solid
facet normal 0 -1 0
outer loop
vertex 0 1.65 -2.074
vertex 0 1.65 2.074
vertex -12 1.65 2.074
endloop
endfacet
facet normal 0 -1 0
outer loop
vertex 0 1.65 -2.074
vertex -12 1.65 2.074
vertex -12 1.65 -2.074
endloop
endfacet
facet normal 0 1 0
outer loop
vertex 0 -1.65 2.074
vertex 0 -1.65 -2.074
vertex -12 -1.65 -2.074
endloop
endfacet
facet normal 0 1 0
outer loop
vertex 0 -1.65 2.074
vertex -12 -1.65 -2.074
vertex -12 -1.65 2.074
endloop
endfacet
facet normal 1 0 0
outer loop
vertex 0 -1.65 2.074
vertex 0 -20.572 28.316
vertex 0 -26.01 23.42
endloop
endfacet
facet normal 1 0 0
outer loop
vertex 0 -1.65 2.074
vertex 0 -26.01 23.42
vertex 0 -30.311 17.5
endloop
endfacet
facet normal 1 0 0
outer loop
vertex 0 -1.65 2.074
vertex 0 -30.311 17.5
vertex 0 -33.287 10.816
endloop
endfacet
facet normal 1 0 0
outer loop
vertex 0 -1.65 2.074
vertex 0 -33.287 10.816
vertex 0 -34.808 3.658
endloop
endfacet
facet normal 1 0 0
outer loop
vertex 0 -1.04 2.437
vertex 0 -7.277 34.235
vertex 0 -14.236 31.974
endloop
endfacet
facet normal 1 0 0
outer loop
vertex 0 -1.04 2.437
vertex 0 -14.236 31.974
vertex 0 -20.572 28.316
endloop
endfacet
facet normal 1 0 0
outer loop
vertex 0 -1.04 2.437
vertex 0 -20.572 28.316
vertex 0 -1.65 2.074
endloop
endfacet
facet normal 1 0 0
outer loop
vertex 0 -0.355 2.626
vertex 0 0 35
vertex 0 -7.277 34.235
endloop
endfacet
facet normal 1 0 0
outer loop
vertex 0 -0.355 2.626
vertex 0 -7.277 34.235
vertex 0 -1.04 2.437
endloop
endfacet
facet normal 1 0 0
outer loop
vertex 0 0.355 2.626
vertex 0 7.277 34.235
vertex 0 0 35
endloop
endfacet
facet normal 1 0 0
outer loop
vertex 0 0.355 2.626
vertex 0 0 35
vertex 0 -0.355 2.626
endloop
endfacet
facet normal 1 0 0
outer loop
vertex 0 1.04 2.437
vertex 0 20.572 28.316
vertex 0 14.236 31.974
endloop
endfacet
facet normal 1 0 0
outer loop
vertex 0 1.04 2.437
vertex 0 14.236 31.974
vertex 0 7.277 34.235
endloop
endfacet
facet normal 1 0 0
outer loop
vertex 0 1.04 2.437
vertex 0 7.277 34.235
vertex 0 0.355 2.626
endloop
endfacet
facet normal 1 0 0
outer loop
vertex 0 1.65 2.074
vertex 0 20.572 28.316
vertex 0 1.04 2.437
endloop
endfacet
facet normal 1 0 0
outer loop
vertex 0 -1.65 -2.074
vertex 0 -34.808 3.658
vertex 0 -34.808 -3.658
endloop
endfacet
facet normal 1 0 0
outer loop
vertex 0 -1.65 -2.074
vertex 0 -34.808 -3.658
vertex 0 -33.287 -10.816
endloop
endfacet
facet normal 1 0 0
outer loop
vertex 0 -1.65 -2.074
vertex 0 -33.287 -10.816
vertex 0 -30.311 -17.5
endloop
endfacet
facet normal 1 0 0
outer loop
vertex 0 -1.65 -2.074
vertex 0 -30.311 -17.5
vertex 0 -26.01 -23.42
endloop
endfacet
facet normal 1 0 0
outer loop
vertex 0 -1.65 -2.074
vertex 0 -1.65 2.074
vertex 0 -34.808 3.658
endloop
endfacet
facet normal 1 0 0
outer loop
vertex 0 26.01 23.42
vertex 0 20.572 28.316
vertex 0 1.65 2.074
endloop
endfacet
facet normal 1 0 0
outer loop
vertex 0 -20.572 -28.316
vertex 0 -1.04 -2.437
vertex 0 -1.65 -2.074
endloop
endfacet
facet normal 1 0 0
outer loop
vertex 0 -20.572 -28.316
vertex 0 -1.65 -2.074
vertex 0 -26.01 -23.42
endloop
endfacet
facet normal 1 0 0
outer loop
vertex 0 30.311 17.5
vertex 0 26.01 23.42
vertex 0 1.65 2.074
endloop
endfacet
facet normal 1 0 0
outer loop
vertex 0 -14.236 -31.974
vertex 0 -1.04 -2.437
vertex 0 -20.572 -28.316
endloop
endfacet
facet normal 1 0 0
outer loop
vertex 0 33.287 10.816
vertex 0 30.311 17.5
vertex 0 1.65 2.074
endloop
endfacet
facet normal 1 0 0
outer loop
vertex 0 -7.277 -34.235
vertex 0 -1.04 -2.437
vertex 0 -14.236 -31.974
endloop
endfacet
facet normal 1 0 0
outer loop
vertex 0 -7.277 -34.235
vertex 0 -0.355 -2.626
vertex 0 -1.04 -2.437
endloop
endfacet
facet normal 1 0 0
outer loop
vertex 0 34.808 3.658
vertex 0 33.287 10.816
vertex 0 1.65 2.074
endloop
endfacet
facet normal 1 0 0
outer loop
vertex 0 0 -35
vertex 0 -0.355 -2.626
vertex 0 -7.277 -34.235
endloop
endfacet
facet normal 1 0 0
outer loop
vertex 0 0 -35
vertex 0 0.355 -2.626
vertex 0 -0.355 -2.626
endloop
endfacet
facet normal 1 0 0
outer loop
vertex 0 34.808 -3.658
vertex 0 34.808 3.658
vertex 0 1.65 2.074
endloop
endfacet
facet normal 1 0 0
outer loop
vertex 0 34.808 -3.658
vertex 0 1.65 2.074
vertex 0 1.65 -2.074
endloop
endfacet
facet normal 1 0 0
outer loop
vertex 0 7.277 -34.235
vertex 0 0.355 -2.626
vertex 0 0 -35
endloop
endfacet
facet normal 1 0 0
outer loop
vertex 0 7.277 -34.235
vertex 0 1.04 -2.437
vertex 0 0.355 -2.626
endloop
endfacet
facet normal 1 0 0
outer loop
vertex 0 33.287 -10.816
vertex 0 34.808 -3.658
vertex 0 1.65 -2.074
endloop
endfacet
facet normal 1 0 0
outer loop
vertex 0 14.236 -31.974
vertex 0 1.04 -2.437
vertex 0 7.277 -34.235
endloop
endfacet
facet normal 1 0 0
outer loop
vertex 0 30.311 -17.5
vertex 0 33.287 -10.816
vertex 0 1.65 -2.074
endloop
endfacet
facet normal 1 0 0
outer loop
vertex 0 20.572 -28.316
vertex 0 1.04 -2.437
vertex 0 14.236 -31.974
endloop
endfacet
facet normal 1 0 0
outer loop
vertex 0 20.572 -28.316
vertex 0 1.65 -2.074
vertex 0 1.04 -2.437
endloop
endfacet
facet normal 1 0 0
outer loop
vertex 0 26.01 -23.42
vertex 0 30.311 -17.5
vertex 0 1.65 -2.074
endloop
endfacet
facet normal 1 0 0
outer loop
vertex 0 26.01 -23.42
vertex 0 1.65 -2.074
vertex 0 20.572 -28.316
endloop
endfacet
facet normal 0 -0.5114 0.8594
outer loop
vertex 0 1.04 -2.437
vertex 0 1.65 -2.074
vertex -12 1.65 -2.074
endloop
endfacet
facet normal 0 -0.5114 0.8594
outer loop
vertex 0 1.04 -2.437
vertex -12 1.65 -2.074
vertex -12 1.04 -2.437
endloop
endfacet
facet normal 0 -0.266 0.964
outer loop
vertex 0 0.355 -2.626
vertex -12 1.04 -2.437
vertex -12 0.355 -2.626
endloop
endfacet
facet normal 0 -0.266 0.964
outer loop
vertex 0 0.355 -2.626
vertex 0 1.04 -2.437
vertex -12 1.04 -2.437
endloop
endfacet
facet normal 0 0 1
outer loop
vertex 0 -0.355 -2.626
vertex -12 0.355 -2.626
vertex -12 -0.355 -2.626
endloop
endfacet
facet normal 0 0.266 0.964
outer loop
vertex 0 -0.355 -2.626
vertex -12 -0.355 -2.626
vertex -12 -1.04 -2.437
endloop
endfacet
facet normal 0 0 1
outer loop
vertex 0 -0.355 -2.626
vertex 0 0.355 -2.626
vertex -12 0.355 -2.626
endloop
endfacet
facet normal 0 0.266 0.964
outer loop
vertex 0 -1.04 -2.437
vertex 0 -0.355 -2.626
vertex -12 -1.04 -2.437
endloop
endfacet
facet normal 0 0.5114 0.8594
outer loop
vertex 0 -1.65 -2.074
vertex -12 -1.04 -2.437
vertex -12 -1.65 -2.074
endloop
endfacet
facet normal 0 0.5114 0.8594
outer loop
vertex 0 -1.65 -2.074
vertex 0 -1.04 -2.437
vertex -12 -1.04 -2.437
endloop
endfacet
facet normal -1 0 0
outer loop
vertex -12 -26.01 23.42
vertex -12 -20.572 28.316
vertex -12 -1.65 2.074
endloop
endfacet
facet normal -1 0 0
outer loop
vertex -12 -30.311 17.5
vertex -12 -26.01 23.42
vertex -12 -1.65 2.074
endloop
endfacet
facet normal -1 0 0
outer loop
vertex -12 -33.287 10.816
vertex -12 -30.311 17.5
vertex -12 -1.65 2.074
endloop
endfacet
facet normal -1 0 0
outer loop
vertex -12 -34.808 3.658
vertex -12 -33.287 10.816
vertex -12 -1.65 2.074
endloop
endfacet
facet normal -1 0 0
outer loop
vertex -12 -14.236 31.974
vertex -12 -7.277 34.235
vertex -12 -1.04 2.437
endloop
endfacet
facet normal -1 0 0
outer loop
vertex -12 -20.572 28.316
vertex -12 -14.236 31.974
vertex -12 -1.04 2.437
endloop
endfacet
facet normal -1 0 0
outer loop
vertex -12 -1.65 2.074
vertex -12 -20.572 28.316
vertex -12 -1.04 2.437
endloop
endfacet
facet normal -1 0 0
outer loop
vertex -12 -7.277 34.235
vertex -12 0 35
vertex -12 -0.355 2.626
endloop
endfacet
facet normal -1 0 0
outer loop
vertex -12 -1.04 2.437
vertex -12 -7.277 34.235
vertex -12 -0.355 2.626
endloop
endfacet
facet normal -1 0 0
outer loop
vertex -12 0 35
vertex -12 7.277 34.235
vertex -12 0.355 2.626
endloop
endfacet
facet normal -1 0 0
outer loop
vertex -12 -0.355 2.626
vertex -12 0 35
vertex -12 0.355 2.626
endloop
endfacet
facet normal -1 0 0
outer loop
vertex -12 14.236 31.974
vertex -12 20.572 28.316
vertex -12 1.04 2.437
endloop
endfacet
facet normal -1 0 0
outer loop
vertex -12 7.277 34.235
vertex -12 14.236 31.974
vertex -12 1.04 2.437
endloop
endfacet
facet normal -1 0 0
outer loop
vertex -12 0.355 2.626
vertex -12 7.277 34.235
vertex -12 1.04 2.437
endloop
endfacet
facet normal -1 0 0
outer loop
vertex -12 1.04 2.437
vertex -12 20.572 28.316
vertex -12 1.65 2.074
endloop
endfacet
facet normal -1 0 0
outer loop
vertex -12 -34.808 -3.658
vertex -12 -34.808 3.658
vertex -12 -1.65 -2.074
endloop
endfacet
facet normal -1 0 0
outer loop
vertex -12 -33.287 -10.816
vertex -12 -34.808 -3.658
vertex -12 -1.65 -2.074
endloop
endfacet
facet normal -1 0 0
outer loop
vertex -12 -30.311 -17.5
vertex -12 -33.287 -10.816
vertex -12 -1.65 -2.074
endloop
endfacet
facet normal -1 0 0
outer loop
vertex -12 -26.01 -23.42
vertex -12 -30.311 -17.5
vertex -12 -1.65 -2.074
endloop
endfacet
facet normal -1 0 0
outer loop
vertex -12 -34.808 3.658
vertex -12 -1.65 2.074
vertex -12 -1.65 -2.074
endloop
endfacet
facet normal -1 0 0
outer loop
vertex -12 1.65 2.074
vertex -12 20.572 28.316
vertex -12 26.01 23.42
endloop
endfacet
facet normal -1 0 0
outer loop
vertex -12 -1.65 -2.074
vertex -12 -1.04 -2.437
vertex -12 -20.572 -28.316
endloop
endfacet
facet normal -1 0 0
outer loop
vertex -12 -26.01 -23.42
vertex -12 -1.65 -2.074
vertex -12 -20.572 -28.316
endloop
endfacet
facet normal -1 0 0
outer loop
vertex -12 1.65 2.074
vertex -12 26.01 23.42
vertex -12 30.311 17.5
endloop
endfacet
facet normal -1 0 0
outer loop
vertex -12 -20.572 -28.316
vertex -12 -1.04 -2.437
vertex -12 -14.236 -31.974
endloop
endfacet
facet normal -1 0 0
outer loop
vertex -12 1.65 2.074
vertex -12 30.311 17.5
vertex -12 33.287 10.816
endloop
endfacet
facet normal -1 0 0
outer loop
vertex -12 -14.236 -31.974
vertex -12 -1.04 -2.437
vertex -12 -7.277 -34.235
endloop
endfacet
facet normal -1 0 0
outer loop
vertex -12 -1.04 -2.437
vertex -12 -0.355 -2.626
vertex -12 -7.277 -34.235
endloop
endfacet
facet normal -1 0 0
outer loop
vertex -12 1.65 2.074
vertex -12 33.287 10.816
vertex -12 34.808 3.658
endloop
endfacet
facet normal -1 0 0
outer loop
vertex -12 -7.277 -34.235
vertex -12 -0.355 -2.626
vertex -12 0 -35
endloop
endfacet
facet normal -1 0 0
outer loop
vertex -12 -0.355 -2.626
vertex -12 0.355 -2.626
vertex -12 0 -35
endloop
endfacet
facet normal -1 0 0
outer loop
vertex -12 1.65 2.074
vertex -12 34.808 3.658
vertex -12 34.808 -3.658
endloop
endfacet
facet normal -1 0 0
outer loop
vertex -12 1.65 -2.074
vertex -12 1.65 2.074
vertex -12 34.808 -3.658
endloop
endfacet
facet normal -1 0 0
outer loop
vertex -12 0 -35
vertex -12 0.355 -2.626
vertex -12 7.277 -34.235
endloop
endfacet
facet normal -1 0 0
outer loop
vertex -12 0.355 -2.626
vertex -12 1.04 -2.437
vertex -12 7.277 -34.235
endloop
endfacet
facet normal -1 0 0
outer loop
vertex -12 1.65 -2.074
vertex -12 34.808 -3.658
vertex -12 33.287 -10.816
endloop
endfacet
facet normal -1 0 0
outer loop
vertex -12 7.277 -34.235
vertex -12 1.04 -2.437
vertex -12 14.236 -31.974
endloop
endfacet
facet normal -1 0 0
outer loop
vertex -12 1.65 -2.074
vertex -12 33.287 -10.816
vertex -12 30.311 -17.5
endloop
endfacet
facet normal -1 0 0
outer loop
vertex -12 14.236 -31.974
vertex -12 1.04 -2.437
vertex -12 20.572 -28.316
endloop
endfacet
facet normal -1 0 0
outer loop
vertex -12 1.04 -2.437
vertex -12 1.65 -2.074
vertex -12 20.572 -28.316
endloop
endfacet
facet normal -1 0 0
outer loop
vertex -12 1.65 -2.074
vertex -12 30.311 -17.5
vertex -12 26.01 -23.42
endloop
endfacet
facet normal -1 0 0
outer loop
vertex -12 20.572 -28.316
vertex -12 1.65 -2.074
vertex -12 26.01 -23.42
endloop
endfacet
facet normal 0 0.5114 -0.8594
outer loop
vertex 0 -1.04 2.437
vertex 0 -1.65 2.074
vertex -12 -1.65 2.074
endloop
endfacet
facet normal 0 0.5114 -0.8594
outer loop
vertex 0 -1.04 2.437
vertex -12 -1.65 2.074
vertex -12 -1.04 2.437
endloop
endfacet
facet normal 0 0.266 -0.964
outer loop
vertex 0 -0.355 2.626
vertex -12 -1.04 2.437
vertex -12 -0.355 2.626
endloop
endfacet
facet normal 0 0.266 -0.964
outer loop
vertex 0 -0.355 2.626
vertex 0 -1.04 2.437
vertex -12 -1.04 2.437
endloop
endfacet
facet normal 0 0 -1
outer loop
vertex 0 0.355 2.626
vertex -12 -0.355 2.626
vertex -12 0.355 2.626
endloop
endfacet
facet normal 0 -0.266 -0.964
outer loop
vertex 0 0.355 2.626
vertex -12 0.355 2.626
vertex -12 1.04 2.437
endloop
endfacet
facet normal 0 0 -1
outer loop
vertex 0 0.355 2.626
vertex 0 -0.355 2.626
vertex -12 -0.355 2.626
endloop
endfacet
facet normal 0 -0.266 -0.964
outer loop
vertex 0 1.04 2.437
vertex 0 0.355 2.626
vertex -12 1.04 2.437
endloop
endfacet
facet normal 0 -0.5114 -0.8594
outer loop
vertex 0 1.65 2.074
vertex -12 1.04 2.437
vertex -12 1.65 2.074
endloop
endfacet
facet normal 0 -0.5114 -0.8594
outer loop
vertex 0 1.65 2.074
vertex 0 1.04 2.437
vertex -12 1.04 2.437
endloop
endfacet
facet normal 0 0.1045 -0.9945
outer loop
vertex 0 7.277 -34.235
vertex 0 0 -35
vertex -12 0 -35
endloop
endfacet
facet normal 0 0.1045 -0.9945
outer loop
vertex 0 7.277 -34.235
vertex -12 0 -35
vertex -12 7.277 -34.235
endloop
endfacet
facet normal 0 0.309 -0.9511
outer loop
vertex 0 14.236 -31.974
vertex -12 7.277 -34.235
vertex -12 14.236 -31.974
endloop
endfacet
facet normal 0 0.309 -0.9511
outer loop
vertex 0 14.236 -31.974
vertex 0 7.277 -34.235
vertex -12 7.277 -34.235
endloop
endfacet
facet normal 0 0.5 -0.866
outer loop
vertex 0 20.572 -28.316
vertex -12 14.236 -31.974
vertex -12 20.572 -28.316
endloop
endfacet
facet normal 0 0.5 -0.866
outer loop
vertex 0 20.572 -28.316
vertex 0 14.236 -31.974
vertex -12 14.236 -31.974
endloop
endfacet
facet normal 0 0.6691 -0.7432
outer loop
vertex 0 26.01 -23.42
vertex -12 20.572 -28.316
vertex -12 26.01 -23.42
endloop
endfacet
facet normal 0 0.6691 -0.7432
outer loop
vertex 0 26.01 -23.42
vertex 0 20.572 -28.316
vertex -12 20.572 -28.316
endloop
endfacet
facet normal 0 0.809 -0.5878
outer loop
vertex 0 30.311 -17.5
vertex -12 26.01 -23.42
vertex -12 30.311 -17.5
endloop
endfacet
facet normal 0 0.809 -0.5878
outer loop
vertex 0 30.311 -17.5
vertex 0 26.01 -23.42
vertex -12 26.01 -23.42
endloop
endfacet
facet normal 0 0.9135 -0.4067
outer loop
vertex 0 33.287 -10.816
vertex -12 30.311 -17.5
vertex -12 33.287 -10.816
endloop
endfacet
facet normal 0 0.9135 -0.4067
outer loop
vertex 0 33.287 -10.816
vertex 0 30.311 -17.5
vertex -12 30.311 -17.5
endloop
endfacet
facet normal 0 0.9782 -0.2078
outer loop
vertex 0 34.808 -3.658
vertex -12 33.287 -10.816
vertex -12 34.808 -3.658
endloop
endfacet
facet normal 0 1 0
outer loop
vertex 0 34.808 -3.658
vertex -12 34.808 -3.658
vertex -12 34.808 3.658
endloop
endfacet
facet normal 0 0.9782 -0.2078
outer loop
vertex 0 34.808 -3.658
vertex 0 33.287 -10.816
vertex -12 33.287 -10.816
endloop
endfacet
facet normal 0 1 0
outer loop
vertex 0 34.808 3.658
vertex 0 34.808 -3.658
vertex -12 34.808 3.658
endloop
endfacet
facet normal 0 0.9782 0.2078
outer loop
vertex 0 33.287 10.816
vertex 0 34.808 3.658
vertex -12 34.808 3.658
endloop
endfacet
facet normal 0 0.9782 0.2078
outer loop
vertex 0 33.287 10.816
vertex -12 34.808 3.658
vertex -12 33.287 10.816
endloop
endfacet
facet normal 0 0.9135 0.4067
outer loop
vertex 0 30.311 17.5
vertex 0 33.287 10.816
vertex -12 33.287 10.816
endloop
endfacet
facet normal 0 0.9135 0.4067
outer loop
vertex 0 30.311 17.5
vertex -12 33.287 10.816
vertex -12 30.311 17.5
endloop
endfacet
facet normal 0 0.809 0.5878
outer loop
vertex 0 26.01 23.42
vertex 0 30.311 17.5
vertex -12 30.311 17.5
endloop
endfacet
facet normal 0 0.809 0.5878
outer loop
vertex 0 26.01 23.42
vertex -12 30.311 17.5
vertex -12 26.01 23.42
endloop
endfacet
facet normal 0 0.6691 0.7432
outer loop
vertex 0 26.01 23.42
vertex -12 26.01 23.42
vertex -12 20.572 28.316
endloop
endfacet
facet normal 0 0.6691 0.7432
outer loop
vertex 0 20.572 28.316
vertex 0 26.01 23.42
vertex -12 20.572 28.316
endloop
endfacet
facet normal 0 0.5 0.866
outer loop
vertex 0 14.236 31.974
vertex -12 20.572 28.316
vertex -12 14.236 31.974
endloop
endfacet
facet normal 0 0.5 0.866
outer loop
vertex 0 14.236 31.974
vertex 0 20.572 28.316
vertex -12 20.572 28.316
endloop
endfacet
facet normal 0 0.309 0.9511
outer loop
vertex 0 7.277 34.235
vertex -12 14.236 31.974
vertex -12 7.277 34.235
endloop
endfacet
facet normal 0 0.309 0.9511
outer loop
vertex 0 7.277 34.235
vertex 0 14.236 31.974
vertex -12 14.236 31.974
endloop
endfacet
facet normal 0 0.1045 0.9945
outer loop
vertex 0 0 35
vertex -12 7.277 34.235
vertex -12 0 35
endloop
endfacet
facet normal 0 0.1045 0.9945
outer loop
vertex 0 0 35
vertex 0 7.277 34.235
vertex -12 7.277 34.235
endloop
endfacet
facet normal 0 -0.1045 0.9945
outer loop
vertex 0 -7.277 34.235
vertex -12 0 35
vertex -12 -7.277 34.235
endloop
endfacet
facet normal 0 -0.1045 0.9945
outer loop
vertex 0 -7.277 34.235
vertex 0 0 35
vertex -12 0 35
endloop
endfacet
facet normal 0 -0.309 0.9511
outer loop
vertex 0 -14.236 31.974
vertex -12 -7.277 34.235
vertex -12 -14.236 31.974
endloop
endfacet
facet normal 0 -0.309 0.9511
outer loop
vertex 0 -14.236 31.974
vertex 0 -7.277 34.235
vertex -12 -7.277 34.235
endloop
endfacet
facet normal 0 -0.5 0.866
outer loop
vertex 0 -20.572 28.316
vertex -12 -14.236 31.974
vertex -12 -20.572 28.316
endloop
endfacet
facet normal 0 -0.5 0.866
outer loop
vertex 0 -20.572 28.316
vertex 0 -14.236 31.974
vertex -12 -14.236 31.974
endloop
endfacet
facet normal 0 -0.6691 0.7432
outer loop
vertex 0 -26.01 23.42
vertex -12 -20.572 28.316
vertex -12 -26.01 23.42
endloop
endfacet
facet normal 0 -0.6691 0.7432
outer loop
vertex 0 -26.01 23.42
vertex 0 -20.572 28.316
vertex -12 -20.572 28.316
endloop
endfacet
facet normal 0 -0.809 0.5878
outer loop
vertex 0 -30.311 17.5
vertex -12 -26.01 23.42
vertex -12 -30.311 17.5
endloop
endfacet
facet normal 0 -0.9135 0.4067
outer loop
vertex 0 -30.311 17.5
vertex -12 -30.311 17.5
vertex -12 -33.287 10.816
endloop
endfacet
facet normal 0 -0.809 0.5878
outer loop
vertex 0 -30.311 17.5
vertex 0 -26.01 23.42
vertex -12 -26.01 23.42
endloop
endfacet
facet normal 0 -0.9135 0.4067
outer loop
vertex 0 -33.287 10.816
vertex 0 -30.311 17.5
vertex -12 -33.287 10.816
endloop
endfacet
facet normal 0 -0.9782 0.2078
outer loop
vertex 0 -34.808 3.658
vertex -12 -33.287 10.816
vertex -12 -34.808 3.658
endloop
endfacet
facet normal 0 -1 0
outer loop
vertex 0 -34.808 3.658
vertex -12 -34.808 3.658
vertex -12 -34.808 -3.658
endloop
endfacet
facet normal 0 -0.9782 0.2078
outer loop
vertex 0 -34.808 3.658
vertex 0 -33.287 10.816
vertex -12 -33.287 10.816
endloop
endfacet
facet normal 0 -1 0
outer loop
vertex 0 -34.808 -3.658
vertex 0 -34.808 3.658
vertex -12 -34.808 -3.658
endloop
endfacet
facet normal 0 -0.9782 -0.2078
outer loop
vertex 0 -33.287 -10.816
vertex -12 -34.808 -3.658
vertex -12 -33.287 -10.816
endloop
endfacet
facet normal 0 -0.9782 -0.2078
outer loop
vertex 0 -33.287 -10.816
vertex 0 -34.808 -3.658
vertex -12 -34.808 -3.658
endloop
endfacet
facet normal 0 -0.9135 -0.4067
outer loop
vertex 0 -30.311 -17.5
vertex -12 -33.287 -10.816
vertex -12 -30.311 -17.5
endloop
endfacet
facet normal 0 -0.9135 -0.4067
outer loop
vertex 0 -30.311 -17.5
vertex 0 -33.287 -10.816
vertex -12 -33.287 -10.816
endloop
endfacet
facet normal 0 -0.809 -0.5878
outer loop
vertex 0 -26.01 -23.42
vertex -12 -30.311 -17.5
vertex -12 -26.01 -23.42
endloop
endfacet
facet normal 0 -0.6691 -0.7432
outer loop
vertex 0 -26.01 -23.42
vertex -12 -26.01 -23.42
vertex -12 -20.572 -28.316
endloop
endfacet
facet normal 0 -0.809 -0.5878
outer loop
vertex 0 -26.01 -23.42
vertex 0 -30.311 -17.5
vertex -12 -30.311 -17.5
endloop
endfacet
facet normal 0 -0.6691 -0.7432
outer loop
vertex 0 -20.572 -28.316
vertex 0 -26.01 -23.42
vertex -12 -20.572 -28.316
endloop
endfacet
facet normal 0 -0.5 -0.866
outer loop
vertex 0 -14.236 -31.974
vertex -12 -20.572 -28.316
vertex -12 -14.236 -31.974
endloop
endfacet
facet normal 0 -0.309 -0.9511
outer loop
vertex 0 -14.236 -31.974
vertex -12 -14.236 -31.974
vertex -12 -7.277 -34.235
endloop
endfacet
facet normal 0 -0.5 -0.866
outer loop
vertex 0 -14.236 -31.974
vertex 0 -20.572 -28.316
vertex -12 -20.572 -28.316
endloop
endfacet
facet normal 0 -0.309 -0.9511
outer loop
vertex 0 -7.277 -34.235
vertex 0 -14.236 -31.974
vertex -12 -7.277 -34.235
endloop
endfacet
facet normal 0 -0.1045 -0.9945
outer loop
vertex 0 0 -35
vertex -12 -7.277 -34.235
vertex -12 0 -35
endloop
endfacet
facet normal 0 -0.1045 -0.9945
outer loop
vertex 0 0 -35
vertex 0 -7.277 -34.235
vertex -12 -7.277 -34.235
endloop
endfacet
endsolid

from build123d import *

# Parameters (mm, degrees)
SKETCH1_R           = 35
BOSS_EXTRUDE1_DEPTH = 12


with BuildPart() as part:
    # Sketch1 → Boss-Extrude1 (new body)
    with BuildSketch(Plane(origin=(0, 0, 0), x_dir=(0, 0, -1), z_dir=(1, 0, 0))):
        Circle(SKETCH1_R)
        with BuildLine():
            Line((-2.073644135, 1.65), (2.073644135, 1.65))
            ThreePointArc((2.073644135, 1.65), (2.65, 0), (2.073644135, -1.65))
            Line((2.073644135, -1.65), (-2.073644135, -1.65))
            ThreePointArc((-2.073644135, -1.65), (-2.65, 0), (-2.073644135, 1.65))
        make_face(mode=Mode.SUBTRACT)
    extrude(amount=-BOSS_EXTRUDE1_DEPTH)


solid = part.part
